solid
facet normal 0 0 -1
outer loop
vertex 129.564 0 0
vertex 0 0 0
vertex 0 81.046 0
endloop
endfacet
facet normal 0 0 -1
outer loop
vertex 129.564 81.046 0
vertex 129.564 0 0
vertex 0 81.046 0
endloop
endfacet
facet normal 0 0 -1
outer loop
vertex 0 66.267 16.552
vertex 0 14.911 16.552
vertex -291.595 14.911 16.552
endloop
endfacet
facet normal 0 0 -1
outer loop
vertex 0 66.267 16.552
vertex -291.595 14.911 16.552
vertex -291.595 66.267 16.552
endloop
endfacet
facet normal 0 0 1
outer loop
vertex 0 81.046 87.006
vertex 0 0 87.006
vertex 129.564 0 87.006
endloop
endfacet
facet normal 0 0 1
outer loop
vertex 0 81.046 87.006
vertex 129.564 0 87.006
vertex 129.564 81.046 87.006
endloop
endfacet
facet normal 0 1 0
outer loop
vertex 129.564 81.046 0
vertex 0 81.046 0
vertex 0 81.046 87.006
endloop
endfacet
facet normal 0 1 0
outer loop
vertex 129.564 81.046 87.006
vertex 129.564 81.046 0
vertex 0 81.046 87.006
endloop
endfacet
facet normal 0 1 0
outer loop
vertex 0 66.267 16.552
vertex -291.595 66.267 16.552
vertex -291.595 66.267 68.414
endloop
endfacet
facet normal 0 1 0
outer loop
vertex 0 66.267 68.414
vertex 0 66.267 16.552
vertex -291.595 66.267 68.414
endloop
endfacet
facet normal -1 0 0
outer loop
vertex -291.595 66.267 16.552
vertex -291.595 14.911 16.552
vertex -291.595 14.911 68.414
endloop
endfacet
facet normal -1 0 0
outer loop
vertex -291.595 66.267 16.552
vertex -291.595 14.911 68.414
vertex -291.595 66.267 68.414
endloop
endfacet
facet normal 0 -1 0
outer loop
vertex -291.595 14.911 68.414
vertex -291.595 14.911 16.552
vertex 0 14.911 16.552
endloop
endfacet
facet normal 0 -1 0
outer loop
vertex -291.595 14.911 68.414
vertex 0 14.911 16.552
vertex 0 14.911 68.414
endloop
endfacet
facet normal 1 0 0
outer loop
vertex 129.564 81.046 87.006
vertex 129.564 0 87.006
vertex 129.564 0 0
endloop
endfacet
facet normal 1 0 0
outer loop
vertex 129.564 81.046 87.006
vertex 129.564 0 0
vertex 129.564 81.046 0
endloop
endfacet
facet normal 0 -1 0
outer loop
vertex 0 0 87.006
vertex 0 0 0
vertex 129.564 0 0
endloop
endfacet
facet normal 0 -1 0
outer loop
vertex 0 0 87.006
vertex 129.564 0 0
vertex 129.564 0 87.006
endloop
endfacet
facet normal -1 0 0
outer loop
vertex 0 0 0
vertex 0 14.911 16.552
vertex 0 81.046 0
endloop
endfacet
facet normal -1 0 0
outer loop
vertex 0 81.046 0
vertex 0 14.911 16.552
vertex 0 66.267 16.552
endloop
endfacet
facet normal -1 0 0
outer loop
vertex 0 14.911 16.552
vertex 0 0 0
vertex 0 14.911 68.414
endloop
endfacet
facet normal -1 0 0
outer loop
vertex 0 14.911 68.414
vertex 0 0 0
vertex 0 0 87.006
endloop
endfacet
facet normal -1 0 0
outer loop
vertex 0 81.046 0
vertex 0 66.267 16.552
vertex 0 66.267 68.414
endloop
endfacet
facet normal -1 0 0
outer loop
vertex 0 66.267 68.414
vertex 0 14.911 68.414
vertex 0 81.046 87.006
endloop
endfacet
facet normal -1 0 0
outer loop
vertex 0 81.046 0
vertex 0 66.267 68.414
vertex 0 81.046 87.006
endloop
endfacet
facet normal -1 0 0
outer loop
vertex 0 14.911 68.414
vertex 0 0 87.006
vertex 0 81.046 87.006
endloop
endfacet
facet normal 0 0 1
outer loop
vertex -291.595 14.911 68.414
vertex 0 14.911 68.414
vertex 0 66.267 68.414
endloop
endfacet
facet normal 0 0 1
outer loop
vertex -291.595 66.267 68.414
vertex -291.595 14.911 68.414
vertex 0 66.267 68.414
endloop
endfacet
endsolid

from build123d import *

# Parameters (mm, degrees)
F0_W     = 81.045844
F0_H     = 87.006435
F1_DEPTH = 129.564196
F2_W     = 51.355398
F2_H     = 51.861688
F3_DEPTH = 421.159267


with BuildPart() as f1:
    # F0 (on Right) → F1 (new body)
    with BuildSketch(Plane.YZ):
        with Locations((40.522922, 43.503217)):
            Rectangle(F0_W, F0_H)
    extrude(amount=F1_DEPTH)

    # F2 (on face) → F3 (join)
    with BuildSketch(Plane.YZ.offset(129.564196)):
        with Locations((40.588942, 42.482689)):
            Rectangle(F2_W, F2_H)
    extrude(amount=-F3_DEPTH)


solid = f1.part
